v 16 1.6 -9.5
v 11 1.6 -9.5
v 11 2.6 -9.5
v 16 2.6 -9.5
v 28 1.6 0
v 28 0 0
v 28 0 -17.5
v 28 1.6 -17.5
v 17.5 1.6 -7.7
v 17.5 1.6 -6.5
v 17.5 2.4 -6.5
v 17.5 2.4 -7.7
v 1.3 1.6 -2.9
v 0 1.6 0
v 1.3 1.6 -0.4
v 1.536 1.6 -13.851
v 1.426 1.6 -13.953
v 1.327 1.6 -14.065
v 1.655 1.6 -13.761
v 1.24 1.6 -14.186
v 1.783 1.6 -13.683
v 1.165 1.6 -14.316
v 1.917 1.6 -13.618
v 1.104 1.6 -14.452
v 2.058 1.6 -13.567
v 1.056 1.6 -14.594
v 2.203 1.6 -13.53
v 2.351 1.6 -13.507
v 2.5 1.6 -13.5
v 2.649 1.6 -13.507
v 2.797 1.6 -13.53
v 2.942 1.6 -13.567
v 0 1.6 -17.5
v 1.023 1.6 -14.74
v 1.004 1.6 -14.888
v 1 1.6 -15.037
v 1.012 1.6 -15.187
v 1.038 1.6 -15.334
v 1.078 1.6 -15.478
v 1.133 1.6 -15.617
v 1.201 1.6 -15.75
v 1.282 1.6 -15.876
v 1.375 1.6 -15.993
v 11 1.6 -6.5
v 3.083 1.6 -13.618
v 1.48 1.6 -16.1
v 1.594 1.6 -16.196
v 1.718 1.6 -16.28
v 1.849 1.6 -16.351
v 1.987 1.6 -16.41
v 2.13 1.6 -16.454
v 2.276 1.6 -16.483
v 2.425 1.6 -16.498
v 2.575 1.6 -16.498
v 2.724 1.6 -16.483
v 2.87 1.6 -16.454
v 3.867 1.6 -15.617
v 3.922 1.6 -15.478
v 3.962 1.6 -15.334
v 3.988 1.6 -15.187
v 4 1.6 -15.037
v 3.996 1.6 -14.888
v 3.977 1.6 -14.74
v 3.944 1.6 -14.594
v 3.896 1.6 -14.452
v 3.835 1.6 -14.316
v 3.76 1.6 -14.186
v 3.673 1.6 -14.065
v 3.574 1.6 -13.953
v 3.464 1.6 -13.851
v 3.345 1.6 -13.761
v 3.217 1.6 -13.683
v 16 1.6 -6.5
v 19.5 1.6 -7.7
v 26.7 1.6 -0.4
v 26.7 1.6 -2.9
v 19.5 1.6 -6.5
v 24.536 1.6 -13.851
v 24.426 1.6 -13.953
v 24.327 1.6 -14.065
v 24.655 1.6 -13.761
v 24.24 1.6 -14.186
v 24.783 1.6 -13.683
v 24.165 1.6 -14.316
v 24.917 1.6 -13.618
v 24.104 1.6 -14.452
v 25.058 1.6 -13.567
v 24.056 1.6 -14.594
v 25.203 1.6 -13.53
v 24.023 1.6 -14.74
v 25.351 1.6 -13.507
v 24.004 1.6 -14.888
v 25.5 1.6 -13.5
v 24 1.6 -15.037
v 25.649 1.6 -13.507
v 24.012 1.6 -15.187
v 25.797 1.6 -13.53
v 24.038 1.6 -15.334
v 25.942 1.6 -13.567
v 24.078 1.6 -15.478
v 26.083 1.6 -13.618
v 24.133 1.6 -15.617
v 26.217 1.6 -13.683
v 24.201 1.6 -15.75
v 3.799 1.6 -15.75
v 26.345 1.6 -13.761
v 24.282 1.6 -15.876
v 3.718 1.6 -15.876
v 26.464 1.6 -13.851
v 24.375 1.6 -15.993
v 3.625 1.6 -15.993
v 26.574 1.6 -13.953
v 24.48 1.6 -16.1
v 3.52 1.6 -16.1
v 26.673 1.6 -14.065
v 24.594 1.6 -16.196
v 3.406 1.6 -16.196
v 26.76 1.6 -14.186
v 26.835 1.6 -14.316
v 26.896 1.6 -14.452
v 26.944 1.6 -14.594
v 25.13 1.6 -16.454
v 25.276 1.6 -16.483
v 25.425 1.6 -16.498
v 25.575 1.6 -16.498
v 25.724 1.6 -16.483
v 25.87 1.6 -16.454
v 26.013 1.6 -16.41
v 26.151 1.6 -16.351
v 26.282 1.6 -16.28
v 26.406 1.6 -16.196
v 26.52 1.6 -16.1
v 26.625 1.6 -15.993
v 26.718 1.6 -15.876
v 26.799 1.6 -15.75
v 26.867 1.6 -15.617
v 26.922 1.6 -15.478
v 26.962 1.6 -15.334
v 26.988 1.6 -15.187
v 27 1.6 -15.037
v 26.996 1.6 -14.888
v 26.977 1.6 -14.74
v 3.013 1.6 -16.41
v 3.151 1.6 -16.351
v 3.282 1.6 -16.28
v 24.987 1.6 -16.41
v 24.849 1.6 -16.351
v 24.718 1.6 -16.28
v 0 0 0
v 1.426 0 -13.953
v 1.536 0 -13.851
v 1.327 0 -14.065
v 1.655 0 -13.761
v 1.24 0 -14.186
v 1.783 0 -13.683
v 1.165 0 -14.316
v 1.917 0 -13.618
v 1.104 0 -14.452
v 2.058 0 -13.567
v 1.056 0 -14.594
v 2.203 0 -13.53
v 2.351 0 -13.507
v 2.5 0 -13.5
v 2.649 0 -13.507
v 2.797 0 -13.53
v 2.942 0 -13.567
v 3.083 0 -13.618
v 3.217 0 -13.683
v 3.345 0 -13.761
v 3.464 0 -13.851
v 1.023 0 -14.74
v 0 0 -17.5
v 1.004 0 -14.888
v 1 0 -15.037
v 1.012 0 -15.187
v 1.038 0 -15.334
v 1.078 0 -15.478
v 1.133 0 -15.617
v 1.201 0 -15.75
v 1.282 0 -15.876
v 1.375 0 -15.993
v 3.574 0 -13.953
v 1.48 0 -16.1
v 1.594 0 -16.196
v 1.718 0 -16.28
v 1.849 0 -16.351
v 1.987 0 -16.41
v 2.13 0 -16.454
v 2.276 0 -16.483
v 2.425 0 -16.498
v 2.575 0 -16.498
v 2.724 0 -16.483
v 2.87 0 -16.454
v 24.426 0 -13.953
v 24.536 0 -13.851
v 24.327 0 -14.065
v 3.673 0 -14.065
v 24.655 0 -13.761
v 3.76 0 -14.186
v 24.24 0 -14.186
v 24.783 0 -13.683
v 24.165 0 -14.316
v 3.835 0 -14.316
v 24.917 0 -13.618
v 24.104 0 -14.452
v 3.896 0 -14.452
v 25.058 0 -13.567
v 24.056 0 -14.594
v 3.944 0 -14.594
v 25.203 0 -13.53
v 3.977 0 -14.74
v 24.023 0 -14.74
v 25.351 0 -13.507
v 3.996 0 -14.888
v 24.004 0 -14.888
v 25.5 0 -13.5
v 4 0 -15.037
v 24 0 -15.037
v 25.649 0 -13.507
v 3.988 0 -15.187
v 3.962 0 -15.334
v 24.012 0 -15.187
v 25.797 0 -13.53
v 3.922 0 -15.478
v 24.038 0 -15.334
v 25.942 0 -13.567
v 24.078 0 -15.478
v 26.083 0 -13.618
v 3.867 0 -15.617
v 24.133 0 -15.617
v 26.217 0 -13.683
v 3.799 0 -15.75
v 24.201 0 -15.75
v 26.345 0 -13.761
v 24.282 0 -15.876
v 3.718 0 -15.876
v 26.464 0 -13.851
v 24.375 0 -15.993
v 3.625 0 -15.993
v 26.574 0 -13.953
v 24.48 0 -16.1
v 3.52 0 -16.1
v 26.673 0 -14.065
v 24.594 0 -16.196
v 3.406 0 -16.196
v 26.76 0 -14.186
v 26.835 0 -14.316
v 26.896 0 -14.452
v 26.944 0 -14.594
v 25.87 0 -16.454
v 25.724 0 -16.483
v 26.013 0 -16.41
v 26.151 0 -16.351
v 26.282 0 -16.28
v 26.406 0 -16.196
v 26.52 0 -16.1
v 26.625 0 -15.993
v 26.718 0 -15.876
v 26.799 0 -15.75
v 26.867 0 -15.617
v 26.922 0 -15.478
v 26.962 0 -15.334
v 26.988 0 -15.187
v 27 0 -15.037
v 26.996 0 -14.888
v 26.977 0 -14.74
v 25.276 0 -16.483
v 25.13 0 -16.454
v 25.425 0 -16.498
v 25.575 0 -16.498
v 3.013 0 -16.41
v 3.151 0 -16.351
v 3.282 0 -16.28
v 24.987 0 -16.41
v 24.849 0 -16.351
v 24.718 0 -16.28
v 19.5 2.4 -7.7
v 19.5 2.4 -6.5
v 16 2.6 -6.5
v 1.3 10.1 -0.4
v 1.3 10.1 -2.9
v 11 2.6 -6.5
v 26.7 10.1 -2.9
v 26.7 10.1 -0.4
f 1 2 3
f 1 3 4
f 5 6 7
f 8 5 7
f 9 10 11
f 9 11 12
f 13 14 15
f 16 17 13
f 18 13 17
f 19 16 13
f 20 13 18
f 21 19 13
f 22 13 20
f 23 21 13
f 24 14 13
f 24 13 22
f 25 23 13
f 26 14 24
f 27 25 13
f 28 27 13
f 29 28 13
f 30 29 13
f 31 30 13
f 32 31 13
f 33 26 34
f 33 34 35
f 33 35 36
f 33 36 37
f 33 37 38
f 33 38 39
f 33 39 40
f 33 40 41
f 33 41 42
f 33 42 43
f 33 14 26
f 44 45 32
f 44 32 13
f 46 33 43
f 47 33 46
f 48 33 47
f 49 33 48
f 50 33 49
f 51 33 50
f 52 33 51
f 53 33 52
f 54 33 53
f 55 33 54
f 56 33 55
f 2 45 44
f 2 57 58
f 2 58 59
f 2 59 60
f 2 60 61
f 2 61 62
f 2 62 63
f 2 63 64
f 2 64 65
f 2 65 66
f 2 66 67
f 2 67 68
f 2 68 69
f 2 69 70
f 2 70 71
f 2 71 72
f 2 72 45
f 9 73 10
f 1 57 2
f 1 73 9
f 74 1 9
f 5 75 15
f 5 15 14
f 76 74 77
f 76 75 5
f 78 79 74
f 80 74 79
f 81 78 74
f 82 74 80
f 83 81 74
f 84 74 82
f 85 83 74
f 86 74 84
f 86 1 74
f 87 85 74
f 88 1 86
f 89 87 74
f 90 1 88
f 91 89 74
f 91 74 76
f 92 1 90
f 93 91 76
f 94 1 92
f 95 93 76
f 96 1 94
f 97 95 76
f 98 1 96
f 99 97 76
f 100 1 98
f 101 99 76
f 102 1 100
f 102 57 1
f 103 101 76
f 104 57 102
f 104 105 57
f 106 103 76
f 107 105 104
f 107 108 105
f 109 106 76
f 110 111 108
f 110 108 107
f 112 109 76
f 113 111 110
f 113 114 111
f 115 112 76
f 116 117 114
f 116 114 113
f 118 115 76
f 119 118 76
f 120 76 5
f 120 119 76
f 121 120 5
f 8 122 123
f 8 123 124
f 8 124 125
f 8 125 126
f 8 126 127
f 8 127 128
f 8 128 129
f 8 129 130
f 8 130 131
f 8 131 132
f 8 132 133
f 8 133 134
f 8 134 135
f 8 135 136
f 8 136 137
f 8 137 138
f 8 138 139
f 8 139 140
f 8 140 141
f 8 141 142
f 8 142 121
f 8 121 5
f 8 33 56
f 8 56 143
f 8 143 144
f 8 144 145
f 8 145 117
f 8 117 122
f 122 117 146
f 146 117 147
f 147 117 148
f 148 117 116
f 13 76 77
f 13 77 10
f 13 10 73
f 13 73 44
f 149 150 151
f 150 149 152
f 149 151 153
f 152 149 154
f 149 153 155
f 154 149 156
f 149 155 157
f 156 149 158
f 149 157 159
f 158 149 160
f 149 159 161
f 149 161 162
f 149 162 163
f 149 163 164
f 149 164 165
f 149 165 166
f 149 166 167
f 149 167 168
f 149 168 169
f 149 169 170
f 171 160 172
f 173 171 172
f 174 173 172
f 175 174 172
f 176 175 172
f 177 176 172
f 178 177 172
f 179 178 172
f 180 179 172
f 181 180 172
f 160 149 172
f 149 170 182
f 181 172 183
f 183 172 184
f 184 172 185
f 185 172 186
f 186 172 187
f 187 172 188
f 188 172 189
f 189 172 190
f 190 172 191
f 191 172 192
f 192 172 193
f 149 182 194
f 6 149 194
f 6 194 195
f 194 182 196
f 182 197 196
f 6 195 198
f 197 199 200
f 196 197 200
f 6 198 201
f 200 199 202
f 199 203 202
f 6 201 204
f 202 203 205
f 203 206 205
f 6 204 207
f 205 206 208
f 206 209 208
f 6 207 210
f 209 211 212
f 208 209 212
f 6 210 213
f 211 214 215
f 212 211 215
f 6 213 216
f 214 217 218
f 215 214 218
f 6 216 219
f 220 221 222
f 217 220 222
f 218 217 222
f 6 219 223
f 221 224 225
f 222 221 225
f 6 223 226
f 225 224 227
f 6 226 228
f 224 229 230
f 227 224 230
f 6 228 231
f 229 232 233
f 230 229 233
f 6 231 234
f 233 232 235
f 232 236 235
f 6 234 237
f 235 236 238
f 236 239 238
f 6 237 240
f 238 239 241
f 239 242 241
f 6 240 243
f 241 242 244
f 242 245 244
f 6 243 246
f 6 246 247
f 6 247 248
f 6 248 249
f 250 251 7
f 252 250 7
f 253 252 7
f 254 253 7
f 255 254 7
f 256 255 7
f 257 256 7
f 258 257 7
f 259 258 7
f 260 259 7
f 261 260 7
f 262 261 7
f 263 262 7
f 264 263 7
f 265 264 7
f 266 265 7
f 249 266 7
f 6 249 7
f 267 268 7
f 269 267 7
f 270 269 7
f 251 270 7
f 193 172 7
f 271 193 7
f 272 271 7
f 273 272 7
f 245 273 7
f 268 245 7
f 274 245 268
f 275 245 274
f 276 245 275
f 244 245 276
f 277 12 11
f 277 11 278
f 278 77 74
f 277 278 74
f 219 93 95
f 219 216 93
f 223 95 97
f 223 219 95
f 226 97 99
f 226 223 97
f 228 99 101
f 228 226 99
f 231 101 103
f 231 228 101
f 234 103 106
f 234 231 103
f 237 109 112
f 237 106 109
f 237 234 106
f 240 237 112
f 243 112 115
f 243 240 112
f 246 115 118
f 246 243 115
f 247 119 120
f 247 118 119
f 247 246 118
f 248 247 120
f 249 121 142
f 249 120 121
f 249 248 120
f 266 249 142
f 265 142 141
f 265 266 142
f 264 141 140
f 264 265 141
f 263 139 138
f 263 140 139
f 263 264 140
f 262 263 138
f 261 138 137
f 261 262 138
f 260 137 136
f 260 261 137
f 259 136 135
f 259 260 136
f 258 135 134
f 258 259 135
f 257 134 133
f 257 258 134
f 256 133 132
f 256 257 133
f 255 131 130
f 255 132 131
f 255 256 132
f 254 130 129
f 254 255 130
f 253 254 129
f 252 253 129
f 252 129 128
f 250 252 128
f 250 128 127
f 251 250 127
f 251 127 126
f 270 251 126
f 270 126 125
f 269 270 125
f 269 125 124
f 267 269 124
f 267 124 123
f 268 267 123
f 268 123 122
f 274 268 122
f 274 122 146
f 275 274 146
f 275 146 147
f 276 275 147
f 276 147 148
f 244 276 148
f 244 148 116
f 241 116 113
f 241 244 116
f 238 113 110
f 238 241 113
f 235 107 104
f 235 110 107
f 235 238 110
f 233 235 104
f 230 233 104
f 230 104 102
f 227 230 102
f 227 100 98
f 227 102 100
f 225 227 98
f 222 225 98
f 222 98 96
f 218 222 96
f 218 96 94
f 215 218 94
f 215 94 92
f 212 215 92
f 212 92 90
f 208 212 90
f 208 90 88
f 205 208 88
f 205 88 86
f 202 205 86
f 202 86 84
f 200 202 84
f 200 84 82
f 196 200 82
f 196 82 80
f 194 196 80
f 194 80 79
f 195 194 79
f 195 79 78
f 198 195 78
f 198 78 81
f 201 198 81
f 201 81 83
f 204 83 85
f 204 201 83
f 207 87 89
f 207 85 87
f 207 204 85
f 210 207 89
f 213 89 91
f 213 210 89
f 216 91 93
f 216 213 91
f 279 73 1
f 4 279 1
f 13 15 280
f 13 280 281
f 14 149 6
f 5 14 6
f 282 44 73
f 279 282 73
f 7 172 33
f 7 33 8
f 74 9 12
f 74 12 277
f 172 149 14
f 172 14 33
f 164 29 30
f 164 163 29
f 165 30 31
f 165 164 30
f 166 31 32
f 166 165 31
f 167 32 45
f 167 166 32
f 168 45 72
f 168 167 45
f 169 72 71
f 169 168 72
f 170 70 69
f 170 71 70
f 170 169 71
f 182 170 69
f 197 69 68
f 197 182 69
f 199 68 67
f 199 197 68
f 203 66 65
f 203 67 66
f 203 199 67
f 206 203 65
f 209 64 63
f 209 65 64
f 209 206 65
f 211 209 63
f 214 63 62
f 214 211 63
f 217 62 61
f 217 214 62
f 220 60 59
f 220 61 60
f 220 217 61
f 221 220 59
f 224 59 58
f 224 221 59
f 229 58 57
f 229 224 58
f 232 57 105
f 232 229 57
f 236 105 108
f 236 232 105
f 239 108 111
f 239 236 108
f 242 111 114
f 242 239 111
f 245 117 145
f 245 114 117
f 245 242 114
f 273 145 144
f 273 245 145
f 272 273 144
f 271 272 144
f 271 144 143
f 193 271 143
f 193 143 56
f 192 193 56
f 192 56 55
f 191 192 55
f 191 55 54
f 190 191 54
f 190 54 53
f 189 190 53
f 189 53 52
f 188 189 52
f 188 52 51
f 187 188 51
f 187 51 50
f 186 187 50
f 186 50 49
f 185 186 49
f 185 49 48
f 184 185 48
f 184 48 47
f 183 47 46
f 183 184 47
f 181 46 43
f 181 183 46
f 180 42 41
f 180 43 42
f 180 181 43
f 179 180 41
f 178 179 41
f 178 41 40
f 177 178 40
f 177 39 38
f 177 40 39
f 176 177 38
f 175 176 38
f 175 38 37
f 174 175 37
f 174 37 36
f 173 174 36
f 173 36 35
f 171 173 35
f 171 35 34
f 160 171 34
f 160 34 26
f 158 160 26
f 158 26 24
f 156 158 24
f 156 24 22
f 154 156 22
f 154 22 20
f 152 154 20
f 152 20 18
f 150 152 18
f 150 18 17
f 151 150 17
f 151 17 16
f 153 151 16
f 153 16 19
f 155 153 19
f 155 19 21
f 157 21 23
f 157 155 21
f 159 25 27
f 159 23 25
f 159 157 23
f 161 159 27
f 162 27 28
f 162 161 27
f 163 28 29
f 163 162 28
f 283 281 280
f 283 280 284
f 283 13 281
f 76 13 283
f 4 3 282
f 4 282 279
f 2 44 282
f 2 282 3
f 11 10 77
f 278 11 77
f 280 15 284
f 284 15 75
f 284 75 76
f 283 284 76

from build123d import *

# Parameters (mm, degrees)
SKETCH1_W               = 28
SKETCH1_H               = 17.5
PCB_DEPTH               = 1.6
MOUNT_HOLE_1_DEPTH      = 34.057676869
MOUNT_HOLE_1_DEPTH_BACK = 34.057676869
SKETCH2_R               = 1.5
MOUNT_HOLE_2_DEPTH      = 34.057676869
MOUNT_HOLE_2_DEPTH_BACK = 34.057676869
SKETCH3_R               = 1.5
HEADER_10PIN_START      = 1.6
SKETCH4_W               = 25.4
SKETCH4_H               = 2.5
HEADER_10PIN_DEPTH      = 8.5
ADS1115_IC_START        = 1.6
SKETCH5_W               = 5
SKETCH5_H               = 3
ADS1115_IC_DEPTH        = 1
CAPS_START              = 1.6
SKETCH6_W               = 2
SKETCH6_H               = 1.2
CAPS_DEPTH              = 0.8


with BuildPart() as part:
    # Sketch1 → PCB (new body)
    with BuildSketch(Plane(origin=(0, 0, 0), x_dir=(1, 0, 0), z_dir=(0, 1, 0))):
        with Locations((14, 8.75)):
            Rectangle(SKETCH1_W, SKETCH1_H)
    extrude(amount=PCB_DEPTH)

    # Sketch2 → Mount_hole_1 (cut, two sides: drawn at the far end of the back side and taken through both)
    with BuildSketch(Plane(origin=(0, 0, 0), x_dir=(1, 0, 0), z_dir=(0, 1, 0)).offset(-MOUNT_HOLE_1_DEPTH_BACK)):
        with Locations(Location((2.5, 15, 0), (0, 0, 270))):
            Circle(SKETCH2_R)
    extrude(amount=MOUNT_HOLE_1_DEPTH + MOUNT_HOLE_1_DEPTH_BACK, mode=Mode.SUBTRACT)

    # Sketch3 → Mount_hole_2 (cut, two sides: drawn at the far end of the back side and taken through both)
    with BuildSketch(Plane(origin=(0, 0, 0), x_dir=(1, 0, 0), z_dir=(0, 1, 0)).offset(-MOUNT_HOLE_2_DEPTH_BACK)):
        with Locations(Location((25.5, 15, 0), (0, 0, 270))):
            Circle(SKETCH3_R)
    extrude(amount=MOUNT_HOLE_2_DEPTH + MOUNT_HOLE_2_DEPTH_BACK, mode=Mode.SUBTRACT)

    # Sketch4 → Header_10pin (add)
    with BuildSketch(Plane(origin=(0, 0, 0), x_dir=(1, 0, 0), z_dir=(0, 1, 0)).offset(HEADER_10PIN_START)):
        with Locations((14, 1.65)):
            Rectangle(SKETCH4_W, SKETCH4_H)
    extrude(amount=HEADER_10PIN_DEPTH)

    # Sketch5 → ADS1115_IC (add)
    with BuildSketch(Plane(origin=(0, 0, 0), x_dir=(1, 0, 0), z_dir=(0, 1, 0)).offset(ADS1115_IC_START)):
        with Locations((13.5, 8)):
            Rectangle(SKETCH5_W, SKETCH5_H)
    extrude(amount=ADS1115_IC_DEPTH)

    # Sketch6 → Caps (add)
    with BuildSketch(Plane(origin=(0, 0, 0), x_dir=(1, 0, 0), z_dir=(0, 1, 0)).offset(CAPS_START)):
        with Locations((18.5, 7.1)):
            Rectangle(SKETCH6_W, SKETCH6_H)
    extrude(amount=CAPS_DEPTH)


solid = part.part
